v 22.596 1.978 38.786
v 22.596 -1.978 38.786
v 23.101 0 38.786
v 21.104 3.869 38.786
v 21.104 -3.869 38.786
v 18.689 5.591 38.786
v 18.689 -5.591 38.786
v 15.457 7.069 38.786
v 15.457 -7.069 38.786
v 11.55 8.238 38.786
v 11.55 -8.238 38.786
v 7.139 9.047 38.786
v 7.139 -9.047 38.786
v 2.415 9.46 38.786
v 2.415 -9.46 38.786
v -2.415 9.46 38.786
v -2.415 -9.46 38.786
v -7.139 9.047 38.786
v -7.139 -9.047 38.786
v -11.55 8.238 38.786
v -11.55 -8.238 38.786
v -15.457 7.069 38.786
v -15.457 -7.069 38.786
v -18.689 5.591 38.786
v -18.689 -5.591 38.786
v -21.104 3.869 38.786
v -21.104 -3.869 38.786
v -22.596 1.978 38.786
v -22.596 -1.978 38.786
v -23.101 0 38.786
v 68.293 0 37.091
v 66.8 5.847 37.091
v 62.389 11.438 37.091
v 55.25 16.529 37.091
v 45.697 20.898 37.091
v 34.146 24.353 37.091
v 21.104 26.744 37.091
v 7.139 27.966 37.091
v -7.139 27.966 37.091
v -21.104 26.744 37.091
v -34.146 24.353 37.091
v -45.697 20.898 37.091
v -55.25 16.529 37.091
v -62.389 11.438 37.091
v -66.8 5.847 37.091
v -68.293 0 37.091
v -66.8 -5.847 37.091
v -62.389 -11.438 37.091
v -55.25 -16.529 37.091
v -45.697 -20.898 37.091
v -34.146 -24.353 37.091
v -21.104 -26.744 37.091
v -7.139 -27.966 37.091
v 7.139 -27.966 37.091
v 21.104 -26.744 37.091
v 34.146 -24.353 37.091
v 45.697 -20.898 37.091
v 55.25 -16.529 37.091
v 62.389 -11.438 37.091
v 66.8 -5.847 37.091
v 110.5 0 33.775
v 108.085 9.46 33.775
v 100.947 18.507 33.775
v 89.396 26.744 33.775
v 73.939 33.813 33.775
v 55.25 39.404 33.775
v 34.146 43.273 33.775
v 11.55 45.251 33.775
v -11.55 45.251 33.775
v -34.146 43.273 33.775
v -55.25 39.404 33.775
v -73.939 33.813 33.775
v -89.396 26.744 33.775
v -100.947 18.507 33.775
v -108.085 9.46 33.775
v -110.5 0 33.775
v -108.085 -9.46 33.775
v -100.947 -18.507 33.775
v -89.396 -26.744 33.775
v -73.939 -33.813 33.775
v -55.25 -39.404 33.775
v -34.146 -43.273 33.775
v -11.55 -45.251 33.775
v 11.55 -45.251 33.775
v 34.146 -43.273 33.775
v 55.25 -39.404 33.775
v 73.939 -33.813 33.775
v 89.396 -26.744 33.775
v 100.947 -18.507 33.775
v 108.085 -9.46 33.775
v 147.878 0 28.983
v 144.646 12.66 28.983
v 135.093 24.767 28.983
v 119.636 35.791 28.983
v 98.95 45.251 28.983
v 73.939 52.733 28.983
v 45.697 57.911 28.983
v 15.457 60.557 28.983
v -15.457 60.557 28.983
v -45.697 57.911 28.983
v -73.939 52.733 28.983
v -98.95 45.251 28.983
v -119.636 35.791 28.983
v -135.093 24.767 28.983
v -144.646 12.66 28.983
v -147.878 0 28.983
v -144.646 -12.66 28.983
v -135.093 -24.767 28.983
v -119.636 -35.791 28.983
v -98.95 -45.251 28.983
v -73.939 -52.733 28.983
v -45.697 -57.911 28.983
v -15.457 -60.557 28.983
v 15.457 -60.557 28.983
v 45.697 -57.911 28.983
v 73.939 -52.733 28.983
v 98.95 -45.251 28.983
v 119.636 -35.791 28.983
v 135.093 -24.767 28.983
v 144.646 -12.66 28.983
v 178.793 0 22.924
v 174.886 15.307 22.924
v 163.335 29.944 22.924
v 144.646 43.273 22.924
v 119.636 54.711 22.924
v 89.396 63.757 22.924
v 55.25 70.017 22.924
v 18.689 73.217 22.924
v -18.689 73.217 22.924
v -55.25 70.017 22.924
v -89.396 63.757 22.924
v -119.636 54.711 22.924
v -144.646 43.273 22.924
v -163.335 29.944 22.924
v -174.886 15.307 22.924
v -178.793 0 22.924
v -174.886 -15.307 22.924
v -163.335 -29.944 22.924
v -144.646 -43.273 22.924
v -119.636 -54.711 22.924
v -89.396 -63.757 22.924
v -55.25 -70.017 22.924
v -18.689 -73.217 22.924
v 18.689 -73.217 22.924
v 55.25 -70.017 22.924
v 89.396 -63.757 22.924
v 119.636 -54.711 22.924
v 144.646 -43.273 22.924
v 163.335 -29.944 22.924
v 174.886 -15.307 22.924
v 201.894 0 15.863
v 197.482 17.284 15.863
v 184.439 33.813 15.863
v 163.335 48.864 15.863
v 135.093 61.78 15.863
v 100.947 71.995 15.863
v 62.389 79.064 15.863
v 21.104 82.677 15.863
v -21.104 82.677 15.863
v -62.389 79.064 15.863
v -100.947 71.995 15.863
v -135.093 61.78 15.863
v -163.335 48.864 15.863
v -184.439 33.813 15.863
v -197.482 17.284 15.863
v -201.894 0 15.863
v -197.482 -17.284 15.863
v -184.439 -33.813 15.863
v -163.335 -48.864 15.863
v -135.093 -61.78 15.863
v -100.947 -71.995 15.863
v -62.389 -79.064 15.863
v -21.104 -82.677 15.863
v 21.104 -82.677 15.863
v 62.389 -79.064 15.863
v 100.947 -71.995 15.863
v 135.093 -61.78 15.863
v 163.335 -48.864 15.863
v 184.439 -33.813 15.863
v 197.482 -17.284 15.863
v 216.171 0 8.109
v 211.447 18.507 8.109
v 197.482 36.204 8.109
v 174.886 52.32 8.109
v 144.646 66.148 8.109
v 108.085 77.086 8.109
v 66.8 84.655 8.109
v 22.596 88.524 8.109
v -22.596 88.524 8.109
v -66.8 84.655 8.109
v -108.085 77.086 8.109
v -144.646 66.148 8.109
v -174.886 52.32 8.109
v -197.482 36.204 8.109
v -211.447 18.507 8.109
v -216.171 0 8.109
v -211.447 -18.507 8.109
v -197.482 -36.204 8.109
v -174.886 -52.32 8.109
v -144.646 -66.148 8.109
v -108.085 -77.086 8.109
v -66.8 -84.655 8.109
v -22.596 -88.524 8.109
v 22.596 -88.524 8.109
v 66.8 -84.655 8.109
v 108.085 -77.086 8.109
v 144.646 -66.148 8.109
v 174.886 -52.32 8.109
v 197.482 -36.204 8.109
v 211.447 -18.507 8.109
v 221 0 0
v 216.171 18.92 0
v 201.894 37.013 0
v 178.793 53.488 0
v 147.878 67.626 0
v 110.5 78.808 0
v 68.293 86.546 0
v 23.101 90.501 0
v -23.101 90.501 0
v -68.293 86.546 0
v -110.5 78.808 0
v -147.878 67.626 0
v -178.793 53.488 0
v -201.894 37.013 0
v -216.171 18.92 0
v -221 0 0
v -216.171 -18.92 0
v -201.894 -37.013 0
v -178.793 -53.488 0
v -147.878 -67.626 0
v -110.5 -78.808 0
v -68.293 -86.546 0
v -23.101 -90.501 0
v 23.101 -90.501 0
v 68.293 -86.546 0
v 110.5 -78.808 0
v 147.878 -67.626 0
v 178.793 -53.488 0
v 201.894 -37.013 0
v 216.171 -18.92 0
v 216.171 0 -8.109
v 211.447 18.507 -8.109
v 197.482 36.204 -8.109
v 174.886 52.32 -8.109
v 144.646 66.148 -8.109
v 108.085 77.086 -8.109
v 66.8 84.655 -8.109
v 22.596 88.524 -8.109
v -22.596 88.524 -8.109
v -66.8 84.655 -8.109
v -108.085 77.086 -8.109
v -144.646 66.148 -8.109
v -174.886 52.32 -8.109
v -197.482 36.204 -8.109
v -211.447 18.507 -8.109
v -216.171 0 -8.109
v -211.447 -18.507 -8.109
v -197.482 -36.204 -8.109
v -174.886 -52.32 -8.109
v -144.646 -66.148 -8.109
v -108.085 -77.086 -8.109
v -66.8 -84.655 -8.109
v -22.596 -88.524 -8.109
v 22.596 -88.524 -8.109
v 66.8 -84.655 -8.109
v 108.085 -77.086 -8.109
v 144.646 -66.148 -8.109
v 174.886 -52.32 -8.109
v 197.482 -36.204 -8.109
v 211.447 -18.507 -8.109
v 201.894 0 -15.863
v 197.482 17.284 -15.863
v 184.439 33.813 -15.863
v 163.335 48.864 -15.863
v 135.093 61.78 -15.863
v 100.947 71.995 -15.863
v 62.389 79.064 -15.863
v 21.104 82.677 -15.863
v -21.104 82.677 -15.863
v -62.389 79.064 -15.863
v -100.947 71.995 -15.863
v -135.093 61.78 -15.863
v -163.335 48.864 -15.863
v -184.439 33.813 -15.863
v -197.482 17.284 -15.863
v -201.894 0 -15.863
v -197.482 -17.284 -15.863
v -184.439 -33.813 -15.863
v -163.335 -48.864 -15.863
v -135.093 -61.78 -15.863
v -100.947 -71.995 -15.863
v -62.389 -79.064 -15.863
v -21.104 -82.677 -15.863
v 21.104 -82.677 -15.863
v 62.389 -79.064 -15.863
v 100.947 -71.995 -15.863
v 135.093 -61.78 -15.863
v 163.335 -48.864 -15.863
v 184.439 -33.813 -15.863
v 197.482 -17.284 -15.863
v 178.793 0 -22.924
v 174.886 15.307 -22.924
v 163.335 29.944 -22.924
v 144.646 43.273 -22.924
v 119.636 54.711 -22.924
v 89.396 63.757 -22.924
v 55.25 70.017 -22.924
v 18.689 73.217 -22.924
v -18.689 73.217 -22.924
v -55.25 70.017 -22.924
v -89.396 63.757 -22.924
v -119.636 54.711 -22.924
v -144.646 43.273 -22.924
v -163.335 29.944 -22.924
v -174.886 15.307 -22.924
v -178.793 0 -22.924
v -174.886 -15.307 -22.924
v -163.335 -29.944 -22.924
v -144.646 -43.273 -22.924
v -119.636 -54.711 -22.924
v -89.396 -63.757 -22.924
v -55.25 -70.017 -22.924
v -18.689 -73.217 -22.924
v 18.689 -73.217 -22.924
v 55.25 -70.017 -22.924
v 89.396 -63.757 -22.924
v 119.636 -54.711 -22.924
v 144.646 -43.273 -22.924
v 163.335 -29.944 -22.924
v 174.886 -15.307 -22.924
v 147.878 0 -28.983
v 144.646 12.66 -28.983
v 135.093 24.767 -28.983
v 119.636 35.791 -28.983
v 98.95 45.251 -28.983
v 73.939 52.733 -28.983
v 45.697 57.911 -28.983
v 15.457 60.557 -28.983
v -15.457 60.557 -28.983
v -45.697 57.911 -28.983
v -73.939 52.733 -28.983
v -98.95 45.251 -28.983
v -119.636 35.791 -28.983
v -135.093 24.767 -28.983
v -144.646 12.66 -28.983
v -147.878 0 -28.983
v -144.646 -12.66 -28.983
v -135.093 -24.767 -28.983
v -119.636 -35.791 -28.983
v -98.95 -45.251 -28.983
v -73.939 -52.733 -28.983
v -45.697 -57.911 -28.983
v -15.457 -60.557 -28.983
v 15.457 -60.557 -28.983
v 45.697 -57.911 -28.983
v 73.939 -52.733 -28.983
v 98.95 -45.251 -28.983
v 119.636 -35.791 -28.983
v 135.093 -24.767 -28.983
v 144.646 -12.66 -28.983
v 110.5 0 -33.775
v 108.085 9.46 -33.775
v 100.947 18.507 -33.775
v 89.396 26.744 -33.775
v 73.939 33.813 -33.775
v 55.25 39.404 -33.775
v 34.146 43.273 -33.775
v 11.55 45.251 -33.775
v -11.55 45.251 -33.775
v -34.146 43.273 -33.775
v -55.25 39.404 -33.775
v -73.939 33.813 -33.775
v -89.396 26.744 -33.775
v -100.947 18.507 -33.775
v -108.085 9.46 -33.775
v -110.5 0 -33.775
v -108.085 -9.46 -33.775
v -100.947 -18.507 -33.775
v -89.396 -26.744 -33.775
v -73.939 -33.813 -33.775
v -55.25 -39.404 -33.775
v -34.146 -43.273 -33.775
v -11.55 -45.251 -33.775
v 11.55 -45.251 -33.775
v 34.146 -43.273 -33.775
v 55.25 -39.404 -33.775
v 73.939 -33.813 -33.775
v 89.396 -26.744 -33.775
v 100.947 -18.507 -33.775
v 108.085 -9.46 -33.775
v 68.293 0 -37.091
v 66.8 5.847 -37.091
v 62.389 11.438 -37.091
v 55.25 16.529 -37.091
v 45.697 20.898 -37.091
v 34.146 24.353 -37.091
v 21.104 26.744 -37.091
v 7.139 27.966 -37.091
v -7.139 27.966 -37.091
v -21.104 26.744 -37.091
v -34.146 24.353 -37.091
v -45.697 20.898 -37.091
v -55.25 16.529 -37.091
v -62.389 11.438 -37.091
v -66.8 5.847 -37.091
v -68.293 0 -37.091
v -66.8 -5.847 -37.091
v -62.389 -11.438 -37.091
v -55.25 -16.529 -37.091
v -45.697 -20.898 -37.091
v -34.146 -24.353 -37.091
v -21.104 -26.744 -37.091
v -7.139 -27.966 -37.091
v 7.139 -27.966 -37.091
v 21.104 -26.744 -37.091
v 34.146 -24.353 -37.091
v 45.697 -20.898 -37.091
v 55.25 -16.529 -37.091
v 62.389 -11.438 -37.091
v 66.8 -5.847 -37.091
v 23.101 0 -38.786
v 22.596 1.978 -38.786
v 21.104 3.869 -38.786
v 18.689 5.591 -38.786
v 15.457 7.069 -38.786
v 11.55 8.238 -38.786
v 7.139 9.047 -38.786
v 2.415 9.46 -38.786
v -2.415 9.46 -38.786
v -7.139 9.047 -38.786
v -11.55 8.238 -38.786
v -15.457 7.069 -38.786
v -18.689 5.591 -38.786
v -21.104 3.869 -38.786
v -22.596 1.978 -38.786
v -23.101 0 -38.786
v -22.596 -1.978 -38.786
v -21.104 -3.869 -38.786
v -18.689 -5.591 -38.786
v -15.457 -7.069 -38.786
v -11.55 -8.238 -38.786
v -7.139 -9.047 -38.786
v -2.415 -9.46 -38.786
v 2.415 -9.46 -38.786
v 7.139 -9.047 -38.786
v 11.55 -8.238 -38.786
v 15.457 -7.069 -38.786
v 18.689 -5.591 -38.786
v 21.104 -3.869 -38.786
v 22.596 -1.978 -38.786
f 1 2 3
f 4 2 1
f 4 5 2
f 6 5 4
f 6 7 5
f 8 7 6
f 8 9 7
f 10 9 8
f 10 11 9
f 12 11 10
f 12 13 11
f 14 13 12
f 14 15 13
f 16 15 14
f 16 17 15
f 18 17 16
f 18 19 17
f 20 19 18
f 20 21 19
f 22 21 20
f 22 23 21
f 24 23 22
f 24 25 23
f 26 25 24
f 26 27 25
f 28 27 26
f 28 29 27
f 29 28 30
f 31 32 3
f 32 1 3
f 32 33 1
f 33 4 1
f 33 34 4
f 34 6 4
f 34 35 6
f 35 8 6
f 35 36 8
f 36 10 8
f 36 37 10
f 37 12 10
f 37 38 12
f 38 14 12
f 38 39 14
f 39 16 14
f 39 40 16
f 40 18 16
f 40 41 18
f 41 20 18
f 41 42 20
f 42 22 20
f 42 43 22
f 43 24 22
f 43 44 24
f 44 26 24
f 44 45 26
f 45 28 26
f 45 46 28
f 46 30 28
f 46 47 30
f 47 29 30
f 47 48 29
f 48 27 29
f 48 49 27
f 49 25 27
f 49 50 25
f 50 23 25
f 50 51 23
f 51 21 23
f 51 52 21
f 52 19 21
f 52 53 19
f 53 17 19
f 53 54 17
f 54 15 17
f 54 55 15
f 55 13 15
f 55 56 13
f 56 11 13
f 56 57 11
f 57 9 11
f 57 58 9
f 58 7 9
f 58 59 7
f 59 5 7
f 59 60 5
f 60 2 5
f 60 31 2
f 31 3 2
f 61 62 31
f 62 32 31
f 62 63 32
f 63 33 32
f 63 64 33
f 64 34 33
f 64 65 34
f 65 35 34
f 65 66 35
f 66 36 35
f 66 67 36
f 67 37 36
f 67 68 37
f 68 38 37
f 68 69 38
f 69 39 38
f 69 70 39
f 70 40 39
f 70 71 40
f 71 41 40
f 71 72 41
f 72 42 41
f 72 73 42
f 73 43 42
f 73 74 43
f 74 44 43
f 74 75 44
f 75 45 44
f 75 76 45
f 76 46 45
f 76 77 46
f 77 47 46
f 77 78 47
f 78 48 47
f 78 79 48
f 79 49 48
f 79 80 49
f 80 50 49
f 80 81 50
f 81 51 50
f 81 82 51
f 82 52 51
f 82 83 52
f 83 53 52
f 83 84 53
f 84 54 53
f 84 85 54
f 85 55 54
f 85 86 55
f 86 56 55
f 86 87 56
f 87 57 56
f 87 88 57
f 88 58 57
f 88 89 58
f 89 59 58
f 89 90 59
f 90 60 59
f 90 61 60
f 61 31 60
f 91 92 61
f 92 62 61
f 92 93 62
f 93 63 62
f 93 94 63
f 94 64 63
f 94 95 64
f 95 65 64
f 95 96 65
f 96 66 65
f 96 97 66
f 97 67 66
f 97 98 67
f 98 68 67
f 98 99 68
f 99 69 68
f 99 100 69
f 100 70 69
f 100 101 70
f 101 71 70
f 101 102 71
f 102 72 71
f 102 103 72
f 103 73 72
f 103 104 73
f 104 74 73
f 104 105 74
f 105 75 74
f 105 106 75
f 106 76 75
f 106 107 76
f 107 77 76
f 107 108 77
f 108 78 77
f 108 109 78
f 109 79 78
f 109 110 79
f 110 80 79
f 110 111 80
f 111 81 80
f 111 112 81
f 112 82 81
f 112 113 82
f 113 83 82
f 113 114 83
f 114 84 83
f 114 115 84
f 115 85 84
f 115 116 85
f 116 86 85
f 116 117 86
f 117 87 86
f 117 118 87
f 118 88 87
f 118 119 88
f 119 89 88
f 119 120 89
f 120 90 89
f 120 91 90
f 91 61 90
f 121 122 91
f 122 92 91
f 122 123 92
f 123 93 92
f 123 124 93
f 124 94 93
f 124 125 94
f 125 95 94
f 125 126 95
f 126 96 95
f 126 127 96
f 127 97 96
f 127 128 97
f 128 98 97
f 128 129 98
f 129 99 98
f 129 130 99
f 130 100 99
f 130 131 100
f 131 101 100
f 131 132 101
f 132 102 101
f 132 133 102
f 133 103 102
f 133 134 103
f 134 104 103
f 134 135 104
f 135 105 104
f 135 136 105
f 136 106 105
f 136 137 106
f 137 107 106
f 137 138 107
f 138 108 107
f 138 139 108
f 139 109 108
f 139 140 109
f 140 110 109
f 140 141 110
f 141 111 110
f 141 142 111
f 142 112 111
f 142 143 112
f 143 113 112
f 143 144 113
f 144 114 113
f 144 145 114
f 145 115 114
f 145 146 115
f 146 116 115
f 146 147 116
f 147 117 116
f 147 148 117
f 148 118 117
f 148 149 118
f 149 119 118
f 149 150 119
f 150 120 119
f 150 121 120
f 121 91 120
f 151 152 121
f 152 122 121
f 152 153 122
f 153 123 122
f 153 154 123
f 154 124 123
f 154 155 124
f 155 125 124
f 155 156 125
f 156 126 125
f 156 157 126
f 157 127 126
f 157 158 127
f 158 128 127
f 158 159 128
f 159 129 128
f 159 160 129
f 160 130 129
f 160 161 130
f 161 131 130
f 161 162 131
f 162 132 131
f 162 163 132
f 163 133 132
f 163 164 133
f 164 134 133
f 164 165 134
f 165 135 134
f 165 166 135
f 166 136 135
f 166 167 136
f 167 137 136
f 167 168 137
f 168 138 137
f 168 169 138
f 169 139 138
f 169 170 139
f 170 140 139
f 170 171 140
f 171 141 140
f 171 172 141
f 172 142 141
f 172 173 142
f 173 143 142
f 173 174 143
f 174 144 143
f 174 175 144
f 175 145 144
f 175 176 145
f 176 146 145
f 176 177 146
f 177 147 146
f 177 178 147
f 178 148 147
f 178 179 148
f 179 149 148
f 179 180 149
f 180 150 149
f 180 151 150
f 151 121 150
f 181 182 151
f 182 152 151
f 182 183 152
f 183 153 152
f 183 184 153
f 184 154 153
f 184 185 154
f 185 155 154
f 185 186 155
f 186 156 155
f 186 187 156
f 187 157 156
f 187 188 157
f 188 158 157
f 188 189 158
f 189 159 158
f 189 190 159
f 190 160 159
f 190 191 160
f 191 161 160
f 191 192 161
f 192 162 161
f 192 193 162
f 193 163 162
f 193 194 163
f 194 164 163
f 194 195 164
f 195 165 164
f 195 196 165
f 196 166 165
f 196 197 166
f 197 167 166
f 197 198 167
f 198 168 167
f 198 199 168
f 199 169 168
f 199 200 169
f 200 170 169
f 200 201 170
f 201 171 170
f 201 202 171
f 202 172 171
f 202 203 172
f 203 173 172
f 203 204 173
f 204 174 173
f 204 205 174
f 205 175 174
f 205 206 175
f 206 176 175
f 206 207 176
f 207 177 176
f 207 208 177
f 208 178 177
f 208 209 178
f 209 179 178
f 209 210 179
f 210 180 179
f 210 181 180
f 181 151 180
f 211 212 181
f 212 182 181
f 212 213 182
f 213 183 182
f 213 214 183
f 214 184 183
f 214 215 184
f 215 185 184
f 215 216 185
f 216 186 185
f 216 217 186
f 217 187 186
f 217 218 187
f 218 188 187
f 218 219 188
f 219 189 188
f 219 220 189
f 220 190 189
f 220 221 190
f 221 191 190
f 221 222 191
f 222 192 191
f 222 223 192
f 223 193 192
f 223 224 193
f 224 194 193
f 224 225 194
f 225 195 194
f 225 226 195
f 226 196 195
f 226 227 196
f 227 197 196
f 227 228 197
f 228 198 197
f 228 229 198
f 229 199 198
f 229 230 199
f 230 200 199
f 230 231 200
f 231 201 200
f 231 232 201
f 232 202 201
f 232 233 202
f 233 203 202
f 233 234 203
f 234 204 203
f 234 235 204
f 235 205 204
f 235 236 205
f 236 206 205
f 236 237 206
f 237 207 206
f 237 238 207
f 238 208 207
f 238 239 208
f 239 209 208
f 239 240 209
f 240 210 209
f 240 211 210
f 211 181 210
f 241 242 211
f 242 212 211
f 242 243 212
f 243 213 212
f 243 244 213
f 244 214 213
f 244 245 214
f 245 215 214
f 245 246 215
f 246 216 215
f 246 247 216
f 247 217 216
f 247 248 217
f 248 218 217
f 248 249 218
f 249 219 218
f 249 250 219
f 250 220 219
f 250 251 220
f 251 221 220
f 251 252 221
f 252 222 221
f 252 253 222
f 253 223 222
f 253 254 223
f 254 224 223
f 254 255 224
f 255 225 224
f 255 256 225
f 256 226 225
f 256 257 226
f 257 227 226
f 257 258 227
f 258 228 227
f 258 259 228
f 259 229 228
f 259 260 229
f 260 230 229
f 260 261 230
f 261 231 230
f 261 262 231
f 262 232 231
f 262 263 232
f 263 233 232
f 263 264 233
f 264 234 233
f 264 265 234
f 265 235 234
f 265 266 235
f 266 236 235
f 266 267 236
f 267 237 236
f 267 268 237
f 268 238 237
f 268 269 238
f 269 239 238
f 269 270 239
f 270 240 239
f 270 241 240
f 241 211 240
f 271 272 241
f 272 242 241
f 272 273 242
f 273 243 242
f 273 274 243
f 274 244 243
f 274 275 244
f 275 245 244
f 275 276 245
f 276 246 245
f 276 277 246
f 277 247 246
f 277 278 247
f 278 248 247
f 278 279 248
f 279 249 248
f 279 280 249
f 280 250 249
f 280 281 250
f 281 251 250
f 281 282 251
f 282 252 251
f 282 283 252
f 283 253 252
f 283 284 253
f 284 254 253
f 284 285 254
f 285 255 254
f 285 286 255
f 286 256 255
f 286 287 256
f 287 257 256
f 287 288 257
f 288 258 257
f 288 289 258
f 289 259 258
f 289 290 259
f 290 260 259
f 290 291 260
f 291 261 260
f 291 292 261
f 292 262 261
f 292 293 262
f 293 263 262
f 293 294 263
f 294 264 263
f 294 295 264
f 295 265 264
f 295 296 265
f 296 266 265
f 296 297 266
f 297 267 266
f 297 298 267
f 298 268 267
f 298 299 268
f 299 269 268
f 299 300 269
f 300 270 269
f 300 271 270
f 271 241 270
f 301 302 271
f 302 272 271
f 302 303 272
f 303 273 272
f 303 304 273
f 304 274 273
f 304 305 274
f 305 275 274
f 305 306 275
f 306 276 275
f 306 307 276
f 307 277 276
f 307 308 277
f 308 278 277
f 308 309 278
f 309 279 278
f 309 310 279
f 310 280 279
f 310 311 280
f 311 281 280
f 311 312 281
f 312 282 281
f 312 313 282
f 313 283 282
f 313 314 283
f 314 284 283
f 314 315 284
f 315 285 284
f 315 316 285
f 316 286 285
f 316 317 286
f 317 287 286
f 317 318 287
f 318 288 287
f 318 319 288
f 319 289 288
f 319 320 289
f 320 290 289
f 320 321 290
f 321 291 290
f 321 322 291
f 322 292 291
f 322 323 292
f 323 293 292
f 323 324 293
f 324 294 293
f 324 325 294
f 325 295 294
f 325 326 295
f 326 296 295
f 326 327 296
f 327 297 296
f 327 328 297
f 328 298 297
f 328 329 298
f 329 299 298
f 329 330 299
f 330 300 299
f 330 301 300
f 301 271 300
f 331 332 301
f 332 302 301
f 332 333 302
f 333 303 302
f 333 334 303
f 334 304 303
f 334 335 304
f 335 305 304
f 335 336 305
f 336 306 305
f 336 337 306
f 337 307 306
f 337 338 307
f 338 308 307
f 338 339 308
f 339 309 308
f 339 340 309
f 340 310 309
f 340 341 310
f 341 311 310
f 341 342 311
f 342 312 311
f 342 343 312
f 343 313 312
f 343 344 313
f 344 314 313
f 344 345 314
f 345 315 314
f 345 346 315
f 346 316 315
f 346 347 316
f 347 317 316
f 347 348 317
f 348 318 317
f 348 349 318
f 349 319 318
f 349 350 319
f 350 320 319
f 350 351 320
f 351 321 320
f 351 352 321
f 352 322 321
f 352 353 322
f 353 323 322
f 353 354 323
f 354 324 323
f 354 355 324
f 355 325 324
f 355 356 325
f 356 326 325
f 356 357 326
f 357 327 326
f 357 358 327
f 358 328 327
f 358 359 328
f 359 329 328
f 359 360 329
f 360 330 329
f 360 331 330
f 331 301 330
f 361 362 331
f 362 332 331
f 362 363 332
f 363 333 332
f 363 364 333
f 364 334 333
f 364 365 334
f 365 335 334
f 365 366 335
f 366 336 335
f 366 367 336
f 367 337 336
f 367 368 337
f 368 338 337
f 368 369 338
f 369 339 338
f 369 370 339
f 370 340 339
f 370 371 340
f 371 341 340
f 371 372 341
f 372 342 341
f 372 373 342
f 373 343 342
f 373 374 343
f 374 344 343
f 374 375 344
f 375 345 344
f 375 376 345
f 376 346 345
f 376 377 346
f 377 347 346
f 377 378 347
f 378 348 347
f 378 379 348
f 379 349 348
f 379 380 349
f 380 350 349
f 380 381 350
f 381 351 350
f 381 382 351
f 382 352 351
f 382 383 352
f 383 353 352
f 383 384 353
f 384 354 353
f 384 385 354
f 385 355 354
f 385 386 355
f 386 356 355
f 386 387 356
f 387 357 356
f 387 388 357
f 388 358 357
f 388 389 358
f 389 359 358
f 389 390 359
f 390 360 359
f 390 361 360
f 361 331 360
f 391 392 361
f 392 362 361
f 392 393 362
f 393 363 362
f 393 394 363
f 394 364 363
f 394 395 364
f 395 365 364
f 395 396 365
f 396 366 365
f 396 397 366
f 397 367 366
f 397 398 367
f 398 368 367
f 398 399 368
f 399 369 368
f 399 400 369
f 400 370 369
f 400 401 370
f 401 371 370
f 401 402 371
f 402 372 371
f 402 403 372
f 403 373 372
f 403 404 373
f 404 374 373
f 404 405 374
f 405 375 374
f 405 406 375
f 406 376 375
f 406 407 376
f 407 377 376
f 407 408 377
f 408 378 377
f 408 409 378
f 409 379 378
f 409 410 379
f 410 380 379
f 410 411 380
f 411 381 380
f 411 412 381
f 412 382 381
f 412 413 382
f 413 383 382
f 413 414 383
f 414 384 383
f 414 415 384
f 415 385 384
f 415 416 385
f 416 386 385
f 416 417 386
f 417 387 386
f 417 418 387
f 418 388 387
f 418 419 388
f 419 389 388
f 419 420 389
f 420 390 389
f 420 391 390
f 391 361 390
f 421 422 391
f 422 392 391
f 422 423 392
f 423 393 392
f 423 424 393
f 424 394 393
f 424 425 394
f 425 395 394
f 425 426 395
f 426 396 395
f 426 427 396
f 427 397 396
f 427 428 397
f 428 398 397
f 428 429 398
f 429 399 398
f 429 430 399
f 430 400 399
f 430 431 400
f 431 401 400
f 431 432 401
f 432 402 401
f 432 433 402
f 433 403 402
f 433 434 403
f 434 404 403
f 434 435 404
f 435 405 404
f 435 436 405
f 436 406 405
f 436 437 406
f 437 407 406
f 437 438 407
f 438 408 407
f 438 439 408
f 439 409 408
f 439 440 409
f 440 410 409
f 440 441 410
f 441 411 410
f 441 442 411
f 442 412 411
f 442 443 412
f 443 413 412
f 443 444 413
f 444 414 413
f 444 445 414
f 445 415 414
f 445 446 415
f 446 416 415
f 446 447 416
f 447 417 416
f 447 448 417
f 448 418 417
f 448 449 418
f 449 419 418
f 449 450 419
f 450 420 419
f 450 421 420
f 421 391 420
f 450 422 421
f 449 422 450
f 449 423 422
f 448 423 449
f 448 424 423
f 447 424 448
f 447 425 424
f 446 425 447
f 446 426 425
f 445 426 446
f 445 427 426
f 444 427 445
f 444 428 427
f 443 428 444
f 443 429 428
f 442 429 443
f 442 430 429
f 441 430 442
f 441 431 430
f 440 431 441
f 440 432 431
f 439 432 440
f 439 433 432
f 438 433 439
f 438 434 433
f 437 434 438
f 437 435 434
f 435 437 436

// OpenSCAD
// Generated by SolidPython 1.0.1 on 2020-07-29 00:46:52


scale(v = [17, 7, 3]) {
	sphere(r = 13);
}
/***********************************************
*********      SolidPython code:      **********
************************************************
 
# import packages: SolidPython
from solid import *
from solid.utils import *
from itertools import chain, combinations, permutations


class Resize:

    def __init__(self, scad_file):
        self.scad_file = scad_file
        #self.scad_file = import_scad(scad_file)
        # cone/cylinder param:
        self.r1 = 0
        self.r2 = 0
        self.h = 0
        # rectangular prism param:
        self.w = 0
        self.l = 0
        # ellipse param:
        self.r = 0

    # import OpenScad code (file name corresponds to shape)


    # classify shape + parameters
    def assign(self, param1, param2, param3):
        if self.scad_file == 'cone.scad':
            self.r1 = param1
            self.r2 = param2
            self.h = param3
        elif self.scad_file == 'cylinder.scad':
            self.r1 = param1
            self.r2 = param2
            self.h = param3
        elif self.scad_file == 'rectangularPrism.scad':
            self.h = param1
            self.l = param2
            self.w = param3
        else:
            self.r = param1
            self.h = param2

    # resize parameters
    def iterate(self):
        x = range(3, 20, 2)
        i = 1
        if self.scad_file == 'cone.scad':
            tempList = list(permutations(x, 2))
            for temp in tempList:
                param1 = temp[0]
                param2 = temp[1]
                filepath = 'produced_scad_files/' + 'cone' + str(param1) + '_' + str(param2) + '_' + '.scad'
                scad_render_to_file(cylinder(h=param1, r1=param2, r2=0), filepath)

        elif self.scad_file == 'cylinder.scad':
            tempList = list(permutations(x, 3))
            for temp in tempList:
                param1 = temp[0]
                param2 = temp[1]
                filepath = 'produced_scad_files/' + 'cylinder' + str(param1) + '_' + str(param2) + '_' + '.scad'
                scad_render_to_file(cylinder(h=param1, r1=param2, r2=param2), filepath)

        elif self.scad_file == 'rectangularPrism.scad':
            tempList = list(permutations(x, 3))
            for temp in tempList:
                param1 = temp[0]
                param2 = temp[1]
                param3 = temp[2]
                filepath = 'produced_scad_files/' + 'rectangularPrism' + str(param1) + '_' + str(param2) + '_' + str(
                    param3) + '.scad'
                scad_render_to_file(cube(size=(param1, param2, param3)), filepath)

        elif self.scad_file == 'ellipse.scad':
            tempList = list(permutations(x, 4))
            for temp in tempList:
                param1 = temp[0]
                param2 = temp[1]
                param3 = temp[2]
                param4 = temp[3]
                filepath = 'produced_scad_files/' + 'ellipse' + str(param1) + '_' + str(param2) + '_' + str(param3) + '_' + str(param4) + '.scad'
                scad_render_to_file(scale([param1, param2, param3])(sphere(r=param4)), filepath)

    def render_to_scadfile(self):
        scad_render_to_file(scad, 'example.scad') 
 
************************************************/
